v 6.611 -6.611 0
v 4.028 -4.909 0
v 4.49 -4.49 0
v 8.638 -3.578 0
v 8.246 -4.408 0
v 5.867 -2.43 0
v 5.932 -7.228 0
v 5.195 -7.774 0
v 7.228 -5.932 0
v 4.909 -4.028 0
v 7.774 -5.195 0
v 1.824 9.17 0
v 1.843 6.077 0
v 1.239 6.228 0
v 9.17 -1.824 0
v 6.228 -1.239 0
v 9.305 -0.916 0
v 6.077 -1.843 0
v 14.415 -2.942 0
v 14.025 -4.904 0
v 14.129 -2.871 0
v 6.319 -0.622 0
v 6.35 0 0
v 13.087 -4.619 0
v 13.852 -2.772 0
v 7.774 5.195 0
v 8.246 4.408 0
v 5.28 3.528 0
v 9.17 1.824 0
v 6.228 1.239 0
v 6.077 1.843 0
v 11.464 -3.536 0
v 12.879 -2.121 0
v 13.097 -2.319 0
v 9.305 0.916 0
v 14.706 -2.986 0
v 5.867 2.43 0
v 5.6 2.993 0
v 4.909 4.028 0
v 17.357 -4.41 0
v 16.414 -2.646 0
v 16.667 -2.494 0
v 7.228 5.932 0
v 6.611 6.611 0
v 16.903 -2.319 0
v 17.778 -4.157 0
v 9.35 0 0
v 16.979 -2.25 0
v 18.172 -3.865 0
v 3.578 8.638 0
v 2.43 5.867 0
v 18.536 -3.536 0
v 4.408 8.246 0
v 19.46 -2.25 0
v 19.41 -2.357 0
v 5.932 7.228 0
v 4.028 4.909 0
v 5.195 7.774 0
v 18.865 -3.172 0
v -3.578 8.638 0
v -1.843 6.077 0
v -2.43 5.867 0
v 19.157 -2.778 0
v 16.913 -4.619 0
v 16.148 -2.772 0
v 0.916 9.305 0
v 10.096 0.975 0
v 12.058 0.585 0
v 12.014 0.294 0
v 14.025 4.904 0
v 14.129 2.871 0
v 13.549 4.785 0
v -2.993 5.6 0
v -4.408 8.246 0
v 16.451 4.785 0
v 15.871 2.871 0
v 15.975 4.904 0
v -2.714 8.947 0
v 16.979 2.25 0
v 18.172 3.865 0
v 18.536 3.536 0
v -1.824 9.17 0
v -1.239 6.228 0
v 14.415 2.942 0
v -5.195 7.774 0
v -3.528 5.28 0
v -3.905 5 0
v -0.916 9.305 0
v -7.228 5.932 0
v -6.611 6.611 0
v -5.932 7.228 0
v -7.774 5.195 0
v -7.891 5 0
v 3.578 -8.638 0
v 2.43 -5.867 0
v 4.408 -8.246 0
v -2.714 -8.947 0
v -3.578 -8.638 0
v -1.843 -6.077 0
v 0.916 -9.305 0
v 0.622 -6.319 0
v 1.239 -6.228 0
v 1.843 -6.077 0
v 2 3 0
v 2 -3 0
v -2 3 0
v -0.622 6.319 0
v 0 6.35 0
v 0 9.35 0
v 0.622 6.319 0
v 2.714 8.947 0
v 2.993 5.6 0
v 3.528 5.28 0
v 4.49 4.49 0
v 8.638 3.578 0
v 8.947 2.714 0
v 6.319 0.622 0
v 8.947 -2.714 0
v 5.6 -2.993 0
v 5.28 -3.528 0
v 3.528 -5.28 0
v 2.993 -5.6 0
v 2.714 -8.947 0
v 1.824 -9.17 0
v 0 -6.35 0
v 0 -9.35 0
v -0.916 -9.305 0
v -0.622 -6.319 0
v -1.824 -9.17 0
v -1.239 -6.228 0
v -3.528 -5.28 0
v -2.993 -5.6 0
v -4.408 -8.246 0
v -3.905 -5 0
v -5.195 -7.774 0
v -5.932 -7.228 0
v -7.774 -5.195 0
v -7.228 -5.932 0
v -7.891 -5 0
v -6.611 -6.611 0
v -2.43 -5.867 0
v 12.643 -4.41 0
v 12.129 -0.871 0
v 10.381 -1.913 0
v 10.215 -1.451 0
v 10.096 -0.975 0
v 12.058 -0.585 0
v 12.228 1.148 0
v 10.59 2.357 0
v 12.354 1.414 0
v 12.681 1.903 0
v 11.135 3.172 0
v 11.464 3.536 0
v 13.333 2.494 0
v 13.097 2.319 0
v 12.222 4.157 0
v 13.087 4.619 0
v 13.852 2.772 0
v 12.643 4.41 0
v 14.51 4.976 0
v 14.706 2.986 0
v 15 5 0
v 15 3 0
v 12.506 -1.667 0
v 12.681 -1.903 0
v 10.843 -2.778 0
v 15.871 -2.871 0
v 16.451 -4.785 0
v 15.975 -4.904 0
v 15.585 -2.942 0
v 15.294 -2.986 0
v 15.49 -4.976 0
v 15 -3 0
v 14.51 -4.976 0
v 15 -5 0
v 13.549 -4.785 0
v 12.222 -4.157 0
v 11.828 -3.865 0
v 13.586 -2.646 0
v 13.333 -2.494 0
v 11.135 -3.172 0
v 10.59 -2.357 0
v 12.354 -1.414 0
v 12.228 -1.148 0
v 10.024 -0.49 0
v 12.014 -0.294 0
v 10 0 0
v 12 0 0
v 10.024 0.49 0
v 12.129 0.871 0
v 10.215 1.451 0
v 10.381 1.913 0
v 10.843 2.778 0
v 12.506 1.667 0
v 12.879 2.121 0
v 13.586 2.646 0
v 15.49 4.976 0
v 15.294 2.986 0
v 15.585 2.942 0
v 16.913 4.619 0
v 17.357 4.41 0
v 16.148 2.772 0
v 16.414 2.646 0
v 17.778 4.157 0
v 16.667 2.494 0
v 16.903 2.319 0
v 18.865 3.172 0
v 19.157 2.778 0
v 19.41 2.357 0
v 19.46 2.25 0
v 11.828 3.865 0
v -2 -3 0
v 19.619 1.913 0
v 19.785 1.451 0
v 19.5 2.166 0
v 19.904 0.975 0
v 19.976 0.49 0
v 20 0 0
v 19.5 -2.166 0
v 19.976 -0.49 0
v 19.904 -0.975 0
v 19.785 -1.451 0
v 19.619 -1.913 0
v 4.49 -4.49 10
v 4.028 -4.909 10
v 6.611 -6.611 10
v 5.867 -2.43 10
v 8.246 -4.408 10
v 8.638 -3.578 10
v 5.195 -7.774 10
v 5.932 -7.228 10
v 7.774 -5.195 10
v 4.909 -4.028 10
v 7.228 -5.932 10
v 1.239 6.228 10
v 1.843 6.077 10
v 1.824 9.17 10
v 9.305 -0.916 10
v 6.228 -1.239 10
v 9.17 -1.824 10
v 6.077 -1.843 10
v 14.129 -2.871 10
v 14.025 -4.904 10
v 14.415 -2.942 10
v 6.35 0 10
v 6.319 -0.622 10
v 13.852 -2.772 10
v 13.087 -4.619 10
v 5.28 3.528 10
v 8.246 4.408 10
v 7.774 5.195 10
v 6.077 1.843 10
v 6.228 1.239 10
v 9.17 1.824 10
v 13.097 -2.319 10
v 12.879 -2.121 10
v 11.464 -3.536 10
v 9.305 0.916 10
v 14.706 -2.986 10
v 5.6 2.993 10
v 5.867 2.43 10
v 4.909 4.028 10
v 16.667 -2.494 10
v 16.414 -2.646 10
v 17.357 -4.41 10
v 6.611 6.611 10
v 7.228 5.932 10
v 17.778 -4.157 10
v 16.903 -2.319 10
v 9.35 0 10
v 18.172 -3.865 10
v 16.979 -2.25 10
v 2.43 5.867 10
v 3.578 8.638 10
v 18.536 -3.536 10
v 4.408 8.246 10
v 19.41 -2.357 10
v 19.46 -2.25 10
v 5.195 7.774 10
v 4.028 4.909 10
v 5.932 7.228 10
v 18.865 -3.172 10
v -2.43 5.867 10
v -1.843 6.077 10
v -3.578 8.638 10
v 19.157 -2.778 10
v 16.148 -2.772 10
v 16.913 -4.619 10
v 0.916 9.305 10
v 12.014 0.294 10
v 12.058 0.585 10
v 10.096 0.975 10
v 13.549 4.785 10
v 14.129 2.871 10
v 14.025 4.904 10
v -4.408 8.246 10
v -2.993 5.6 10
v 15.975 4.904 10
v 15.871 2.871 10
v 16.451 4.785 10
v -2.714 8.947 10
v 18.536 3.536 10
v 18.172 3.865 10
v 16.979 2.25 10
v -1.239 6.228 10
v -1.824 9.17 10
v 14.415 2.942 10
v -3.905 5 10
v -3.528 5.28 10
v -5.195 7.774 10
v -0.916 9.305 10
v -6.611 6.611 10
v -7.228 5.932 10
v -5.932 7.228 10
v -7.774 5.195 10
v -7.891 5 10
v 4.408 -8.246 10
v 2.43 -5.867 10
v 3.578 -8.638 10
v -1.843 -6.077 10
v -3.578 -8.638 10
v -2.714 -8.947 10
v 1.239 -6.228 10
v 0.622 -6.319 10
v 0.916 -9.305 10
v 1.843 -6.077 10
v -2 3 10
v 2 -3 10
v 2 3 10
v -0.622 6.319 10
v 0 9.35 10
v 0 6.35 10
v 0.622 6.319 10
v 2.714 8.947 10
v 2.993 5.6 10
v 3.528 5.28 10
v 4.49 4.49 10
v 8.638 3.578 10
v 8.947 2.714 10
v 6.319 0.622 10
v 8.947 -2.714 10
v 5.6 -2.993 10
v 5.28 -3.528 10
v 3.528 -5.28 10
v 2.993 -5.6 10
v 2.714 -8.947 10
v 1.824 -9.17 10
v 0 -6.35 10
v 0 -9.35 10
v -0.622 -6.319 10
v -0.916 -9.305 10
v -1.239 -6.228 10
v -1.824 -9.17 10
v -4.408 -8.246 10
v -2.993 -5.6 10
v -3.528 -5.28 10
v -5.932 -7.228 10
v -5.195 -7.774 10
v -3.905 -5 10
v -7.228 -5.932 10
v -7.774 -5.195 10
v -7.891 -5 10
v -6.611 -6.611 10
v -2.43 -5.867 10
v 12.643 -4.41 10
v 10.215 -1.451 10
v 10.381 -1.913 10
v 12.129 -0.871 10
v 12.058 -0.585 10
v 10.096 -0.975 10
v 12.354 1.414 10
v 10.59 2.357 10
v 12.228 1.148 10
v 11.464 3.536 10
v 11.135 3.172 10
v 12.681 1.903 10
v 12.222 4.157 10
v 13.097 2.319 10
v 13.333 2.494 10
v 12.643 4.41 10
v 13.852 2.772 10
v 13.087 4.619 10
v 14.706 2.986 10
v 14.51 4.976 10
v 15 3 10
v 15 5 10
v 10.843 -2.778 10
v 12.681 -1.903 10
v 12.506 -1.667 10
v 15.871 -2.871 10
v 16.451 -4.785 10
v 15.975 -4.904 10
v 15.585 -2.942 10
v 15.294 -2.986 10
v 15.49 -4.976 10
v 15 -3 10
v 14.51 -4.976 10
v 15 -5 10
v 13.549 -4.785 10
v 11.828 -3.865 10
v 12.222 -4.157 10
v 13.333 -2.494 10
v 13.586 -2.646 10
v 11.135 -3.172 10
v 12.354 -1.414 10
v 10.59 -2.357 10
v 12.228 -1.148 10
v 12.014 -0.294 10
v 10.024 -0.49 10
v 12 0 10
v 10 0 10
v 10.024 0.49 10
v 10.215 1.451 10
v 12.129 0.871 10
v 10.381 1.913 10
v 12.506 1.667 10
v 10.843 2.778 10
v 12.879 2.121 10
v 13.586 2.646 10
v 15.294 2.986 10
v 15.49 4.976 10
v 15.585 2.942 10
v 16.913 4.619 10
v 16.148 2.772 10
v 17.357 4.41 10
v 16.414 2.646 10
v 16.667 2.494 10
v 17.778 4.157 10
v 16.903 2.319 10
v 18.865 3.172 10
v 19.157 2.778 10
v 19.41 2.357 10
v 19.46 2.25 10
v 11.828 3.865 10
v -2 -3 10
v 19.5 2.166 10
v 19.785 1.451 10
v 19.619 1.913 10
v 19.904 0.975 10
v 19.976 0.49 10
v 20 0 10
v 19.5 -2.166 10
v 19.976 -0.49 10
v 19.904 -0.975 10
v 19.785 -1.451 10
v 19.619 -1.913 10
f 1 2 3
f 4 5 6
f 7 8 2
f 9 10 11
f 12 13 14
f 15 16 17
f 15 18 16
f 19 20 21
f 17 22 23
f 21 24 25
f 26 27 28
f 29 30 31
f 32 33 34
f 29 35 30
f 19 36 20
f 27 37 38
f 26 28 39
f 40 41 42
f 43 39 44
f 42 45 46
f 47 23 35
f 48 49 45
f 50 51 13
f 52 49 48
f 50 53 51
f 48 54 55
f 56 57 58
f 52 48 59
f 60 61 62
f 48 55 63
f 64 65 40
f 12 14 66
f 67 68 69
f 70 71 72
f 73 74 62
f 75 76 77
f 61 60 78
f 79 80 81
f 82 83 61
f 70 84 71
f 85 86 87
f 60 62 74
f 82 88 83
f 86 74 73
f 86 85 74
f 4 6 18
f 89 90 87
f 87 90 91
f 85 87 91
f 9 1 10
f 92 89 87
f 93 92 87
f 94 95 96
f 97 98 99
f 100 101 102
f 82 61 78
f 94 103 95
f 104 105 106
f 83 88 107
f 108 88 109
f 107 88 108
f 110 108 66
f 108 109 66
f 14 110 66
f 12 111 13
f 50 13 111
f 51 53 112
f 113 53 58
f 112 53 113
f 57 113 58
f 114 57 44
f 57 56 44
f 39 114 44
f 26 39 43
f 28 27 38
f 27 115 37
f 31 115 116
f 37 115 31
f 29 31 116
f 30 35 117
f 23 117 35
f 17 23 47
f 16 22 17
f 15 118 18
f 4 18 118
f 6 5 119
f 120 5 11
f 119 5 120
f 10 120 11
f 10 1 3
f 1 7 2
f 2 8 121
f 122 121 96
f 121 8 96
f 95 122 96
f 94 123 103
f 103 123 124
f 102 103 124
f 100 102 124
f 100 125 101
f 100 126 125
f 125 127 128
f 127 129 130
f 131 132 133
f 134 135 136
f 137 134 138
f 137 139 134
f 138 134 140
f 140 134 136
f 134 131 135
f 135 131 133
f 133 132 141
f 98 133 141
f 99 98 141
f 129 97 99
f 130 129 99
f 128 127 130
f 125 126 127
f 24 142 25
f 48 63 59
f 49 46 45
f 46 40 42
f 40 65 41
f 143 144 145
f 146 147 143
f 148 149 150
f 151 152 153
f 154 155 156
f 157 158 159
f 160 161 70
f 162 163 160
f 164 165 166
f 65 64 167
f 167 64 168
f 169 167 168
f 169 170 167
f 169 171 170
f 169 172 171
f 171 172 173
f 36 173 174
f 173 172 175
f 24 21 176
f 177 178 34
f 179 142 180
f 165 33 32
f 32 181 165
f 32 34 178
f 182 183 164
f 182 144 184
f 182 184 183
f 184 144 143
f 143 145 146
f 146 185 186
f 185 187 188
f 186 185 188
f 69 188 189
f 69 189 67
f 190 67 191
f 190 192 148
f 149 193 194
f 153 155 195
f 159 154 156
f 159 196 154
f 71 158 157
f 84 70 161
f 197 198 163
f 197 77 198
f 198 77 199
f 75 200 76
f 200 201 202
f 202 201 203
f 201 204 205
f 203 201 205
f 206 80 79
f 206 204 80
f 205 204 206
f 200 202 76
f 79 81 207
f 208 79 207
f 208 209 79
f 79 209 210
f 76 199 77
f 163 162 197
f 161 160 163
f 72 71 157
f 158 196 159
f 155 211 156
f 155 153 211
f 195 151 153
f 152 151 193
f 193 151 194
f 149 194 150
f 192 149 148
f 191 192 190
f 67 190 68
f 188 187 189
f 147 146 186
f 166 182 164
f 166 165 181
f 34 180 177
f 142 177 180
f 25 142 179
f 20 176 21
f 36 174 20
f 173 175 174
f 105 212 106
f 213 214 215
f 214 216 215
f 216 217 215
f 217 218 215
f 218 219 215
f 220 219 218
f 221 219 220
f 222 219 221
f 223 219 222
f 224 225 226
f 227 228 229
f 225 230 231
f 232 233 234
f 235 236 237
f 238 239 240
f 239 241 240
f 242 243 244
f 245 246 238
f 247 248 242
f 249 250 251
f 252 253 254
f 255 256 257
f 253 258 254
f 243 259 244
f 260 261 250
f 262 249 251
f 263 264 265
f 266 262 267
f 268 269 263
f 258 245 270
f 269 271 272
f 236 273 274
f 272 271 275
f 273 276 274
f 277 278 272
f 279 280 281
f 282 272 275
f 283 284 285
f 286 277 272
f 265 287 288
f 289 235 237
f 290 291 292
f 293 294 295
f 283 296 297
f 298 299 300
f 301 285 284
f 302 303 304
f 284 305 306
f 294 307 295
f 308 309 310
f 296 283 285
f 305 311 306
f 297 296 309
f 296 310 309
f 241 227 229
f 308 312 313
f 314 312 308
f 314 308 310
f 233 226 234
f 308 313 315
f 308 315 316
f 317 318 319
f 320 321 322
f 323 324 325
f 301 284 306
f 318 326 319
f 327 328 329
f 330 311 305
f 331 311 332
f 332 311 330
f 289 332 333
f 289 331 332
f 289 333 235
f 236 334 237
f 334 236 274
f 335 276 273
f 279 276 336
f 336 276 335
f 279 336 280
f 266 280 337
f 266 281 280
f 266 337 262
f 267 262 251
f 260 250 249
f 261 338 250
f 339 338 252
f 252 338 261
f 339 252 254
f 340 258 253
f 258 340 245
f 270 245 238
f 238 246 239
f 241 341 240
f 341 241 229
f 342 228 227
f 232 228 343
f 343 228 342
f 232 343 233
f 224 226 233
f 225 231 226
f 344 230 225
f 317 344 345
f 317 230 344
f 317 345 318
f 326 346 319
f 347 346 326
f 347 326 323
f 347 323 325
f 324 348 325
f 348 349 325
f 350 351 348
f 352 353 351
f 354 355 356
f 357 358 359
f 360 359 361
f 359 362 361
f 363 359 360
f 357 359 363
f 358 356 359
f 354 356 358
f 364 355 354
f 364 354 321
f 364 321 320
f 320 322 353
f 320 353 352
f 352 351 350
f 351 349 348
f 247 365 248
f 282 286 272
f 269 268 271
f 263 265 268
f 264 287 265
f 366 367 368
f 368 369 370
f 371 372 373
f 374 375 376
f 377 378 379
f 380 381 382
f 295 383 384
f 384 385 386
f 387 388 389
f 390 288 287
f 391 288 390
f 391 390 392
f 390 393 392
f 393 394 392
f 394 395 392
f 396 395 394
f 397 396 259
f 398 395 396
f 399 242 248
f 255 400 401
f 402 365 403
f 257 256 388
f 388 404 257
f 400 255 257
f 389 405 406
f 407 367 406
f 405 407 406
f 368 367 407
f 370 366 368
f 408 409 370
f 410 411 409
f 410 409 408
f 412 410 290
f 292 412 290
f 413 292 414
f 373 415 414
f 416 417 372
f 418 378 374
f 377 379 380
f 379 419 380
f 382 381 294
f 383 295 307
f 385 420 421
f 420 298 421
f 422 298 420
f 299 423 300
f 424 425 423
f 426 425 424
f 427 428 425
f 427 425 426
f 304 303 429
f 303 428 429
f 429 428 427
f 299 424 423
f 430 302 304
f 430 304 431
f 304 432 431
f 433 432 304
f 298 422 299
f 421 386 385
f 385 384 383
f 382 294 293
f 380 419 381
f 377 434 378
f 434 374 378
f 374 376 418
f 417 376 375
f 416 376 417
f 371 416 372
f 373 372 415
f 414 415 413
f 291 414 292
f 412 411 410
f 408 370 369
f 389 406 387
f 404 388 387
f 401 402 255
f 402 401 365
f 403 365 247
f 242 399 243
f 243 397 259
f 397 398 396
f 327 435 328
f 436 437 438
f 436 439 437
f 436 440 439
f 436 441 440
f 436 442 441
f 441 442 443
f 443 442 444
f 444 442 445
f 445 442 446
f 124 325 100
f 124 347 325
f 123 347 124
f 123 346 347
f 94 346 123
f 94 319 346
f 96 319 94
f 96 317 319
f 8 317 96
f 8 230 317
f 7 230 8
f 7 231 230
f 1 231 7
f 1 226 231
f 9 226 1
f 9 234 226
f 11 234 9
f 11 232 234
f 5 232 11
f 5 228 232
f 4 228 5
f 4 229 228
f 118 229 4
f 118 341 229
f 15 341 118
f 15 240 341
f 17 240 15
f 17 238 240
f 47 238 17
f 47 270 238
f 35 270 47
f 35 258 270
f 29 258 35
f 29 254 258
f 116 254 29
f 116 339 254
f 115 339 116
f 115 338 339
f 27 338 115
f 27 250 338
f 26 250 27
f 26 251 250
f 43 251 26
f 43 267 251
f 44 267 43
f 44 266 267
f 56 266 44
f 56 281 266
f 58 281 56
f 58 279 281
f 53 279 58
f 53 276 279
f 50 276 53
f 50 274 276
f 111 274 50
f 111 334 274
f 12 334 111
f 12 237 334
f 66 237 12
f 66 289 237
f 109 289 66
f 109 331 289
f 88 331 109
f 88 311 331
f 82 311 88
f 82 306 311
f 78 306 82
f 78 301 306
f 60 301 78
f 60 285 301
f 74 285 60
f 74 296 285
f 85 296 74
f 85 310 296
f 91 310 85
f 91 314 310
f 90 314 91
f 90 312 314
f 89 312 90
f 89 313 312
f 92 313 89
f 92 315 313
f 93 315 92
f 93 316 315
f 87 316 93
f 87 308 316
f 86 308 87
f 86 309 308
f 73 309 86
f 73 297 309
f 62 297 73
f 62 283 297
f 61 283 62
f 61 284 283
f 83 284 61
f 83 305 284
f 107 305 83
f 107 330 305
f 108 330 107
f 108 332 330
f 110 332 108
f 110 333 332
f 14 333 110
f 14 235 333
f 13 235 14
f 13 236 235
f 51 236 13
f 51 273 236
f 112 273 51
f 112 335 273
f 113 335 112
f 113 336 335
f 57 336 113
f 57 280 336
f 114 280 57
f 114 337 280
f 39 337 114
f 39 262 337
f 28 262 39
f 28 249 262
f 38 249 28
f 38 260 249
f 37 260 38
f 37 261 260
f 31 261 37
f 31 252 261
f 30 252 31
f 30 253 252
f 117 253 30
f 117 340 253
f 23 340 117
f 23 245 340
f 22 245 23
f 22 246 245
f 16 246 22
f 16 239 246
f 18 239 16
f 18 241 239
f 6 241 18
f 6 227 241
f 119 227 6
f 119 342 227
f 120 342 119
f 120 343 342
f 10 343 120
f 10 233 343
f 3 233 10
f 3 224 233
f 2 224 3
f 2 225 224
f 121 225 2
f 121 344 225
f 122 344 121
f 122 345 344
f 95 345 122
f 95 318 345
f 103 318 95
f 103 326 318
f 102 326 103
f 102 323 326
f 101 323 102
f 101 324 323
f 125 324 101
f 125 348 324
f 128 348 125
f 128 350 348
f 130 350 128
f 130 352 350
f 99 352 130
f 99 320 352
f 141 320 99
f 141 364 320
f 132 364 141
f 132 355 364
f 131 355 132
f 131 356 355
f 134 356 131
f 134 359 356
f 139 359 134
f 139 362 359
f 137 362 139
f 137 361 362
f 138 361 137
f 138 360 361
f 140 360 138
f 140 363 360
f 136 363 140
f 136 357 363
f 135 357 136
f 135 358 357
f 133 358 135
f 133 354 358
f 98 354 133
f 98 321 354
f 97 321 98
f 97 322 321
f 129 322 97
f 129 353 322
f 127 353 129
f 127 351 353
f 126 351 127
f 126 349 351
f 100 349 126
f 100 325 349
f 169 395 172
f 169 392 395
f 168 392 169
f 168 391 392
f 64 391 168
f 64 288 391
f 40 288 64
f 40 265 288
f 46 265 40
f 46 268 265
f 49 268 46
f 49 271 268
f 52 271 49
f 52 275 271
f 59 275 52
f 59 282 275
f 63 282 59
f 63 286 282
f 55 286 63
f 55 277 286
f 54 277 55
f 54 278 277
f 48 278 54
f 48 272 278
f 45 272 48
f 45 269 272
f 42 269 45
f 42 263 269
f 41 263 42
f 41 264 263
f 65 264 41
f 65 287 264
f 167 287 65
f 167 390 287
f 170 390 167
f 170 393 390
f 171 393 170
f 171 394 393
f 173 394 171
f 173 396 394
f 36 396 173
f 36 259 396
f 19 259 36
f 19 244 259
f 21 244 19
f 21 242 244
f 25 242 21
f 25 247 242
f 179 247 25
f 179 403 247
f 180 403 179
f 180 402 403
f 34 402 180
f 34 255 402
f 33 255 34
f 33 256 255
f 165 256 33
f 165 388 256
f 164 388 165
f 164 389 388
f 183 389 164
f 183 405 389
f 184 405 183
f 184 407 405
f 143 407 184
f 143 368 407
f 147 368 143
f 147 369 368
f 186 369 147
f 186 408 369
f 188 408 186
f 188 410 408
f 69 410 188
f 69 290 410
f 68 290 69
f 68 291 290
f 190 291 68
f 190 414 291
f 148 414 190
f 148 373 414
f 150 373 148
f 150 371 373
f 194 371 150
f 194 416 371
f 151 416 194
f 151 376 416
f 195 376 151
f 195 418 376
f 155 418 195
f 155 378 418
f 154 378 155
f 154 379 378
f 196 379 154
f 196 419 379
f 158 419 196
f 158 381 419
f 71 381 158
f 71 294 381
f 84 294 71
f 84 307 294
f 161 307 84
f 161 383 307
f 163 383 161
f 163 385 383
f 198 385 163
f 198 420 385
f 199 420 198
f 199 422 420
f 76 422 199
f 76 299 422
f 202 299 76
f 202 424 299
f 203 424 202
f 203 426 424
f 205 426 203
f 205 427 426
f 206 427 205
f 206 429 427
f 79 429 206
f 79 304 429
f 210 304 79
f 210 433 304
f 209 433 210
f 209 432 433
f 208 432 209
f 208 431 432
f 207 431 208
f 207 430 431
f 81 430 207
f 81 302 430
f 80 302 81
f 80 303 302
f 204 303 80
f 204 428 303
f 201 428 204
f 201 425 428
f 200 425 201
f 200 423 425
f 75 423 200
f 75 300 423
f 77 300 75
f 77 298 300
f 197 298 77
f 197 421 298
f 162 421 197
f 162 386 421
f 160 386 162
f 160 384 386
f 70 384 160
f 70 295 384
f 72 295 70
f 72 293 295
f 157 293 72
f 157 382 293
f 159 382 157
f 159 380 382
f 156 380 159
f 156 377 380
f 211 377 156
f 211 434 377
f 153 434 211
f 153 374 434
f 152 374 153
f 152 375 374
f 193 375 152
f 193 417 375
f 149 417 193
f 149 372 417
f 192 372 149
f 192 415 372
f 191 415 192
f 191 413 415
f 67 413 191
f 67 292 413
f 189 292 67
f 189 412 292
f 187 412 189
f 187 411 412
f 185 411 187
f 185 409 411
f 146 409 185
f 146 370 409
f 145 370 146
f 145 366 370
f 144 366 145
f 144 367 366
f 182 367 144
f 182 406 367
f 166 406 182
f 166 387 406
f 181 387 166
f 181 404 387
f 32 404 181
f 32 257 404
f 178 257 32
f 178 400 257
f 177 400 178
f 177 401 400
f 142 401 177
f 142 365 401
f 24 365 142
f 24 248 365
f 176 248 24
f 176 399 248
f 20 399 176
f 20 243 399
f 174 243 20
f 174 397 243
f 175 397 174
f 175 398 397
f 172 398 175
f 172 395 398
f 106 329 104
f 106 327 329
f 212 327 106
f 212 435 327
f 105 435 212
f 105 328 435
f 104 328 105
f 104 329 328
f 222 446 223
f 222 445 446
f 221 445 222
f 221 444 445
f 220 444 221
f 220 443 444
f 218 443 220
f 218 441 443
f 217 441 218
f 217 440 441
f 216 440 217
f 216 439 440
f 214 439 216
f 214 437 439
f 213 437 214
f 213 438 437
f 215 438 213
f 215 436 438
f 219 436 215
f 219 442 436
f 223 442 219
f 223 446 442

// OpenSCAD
$fn = 64;

// Dimensions
z_height = 10;
rod_id = 12.7;
rod_wall = 3;
tube_id = 6;
tube_wall = 2;
bridge_x_start = 8;
bridge_x_end = 12;
bridge_y_width = 6;
rod_opening_w = 10;
rod_opening_h = 10;
tube_opening_w = 4.5;
tube_opening_h = 4.5;

// Rod Ring Module
module rod_ring() {
    difference() {
        // Outer shape of the rod ring
        circle(r = rod_id / 2 + rod_wall);
        // Inner hole for the rod
        circle(r = rod_id / 2);
        // Opening on the -X side (x < 0)
        translate([-rod_opening_w / 2, 0])
        square([rod_opening_w, rod_opening_h], center=true);
    }
}

// Tubing Ring Module
module tube_ring() {
    translate([15, 0]) {
        difference() {
            // Outer shape of the tubing ring
            circle(r = tube_id / 2 + tube_wall);
            // Inner hole for the tubing
            circle(r = tube_id / 2);
            // Opening on the +X side (x > 15)
            translate([tube_opening_w / 2, 0])
            square([tube_opening_w, tube_opening_h], center=true);
        }
    }
}

// Bridge Module
module bridge() {
    // Solid rectangle connecting the rings
    square([bridge_x_end - bridge_x_start, bridge_y_width], center=true);
}

// Main Clip Body
module clip_body() {
    union() {
        rod_ring();
        tube_ring();
        bridge();
    }
}

// Final Assembly
module clip() {
    difference() {
        linear_extrude(height = z_height) {
            clip_body();
        }
        // The cutouts are defined as voids (squares) which naturally cut through the material.
        // This satisfies the requirement to extend past faces as they cut into the solid.
    }
}

clip();
